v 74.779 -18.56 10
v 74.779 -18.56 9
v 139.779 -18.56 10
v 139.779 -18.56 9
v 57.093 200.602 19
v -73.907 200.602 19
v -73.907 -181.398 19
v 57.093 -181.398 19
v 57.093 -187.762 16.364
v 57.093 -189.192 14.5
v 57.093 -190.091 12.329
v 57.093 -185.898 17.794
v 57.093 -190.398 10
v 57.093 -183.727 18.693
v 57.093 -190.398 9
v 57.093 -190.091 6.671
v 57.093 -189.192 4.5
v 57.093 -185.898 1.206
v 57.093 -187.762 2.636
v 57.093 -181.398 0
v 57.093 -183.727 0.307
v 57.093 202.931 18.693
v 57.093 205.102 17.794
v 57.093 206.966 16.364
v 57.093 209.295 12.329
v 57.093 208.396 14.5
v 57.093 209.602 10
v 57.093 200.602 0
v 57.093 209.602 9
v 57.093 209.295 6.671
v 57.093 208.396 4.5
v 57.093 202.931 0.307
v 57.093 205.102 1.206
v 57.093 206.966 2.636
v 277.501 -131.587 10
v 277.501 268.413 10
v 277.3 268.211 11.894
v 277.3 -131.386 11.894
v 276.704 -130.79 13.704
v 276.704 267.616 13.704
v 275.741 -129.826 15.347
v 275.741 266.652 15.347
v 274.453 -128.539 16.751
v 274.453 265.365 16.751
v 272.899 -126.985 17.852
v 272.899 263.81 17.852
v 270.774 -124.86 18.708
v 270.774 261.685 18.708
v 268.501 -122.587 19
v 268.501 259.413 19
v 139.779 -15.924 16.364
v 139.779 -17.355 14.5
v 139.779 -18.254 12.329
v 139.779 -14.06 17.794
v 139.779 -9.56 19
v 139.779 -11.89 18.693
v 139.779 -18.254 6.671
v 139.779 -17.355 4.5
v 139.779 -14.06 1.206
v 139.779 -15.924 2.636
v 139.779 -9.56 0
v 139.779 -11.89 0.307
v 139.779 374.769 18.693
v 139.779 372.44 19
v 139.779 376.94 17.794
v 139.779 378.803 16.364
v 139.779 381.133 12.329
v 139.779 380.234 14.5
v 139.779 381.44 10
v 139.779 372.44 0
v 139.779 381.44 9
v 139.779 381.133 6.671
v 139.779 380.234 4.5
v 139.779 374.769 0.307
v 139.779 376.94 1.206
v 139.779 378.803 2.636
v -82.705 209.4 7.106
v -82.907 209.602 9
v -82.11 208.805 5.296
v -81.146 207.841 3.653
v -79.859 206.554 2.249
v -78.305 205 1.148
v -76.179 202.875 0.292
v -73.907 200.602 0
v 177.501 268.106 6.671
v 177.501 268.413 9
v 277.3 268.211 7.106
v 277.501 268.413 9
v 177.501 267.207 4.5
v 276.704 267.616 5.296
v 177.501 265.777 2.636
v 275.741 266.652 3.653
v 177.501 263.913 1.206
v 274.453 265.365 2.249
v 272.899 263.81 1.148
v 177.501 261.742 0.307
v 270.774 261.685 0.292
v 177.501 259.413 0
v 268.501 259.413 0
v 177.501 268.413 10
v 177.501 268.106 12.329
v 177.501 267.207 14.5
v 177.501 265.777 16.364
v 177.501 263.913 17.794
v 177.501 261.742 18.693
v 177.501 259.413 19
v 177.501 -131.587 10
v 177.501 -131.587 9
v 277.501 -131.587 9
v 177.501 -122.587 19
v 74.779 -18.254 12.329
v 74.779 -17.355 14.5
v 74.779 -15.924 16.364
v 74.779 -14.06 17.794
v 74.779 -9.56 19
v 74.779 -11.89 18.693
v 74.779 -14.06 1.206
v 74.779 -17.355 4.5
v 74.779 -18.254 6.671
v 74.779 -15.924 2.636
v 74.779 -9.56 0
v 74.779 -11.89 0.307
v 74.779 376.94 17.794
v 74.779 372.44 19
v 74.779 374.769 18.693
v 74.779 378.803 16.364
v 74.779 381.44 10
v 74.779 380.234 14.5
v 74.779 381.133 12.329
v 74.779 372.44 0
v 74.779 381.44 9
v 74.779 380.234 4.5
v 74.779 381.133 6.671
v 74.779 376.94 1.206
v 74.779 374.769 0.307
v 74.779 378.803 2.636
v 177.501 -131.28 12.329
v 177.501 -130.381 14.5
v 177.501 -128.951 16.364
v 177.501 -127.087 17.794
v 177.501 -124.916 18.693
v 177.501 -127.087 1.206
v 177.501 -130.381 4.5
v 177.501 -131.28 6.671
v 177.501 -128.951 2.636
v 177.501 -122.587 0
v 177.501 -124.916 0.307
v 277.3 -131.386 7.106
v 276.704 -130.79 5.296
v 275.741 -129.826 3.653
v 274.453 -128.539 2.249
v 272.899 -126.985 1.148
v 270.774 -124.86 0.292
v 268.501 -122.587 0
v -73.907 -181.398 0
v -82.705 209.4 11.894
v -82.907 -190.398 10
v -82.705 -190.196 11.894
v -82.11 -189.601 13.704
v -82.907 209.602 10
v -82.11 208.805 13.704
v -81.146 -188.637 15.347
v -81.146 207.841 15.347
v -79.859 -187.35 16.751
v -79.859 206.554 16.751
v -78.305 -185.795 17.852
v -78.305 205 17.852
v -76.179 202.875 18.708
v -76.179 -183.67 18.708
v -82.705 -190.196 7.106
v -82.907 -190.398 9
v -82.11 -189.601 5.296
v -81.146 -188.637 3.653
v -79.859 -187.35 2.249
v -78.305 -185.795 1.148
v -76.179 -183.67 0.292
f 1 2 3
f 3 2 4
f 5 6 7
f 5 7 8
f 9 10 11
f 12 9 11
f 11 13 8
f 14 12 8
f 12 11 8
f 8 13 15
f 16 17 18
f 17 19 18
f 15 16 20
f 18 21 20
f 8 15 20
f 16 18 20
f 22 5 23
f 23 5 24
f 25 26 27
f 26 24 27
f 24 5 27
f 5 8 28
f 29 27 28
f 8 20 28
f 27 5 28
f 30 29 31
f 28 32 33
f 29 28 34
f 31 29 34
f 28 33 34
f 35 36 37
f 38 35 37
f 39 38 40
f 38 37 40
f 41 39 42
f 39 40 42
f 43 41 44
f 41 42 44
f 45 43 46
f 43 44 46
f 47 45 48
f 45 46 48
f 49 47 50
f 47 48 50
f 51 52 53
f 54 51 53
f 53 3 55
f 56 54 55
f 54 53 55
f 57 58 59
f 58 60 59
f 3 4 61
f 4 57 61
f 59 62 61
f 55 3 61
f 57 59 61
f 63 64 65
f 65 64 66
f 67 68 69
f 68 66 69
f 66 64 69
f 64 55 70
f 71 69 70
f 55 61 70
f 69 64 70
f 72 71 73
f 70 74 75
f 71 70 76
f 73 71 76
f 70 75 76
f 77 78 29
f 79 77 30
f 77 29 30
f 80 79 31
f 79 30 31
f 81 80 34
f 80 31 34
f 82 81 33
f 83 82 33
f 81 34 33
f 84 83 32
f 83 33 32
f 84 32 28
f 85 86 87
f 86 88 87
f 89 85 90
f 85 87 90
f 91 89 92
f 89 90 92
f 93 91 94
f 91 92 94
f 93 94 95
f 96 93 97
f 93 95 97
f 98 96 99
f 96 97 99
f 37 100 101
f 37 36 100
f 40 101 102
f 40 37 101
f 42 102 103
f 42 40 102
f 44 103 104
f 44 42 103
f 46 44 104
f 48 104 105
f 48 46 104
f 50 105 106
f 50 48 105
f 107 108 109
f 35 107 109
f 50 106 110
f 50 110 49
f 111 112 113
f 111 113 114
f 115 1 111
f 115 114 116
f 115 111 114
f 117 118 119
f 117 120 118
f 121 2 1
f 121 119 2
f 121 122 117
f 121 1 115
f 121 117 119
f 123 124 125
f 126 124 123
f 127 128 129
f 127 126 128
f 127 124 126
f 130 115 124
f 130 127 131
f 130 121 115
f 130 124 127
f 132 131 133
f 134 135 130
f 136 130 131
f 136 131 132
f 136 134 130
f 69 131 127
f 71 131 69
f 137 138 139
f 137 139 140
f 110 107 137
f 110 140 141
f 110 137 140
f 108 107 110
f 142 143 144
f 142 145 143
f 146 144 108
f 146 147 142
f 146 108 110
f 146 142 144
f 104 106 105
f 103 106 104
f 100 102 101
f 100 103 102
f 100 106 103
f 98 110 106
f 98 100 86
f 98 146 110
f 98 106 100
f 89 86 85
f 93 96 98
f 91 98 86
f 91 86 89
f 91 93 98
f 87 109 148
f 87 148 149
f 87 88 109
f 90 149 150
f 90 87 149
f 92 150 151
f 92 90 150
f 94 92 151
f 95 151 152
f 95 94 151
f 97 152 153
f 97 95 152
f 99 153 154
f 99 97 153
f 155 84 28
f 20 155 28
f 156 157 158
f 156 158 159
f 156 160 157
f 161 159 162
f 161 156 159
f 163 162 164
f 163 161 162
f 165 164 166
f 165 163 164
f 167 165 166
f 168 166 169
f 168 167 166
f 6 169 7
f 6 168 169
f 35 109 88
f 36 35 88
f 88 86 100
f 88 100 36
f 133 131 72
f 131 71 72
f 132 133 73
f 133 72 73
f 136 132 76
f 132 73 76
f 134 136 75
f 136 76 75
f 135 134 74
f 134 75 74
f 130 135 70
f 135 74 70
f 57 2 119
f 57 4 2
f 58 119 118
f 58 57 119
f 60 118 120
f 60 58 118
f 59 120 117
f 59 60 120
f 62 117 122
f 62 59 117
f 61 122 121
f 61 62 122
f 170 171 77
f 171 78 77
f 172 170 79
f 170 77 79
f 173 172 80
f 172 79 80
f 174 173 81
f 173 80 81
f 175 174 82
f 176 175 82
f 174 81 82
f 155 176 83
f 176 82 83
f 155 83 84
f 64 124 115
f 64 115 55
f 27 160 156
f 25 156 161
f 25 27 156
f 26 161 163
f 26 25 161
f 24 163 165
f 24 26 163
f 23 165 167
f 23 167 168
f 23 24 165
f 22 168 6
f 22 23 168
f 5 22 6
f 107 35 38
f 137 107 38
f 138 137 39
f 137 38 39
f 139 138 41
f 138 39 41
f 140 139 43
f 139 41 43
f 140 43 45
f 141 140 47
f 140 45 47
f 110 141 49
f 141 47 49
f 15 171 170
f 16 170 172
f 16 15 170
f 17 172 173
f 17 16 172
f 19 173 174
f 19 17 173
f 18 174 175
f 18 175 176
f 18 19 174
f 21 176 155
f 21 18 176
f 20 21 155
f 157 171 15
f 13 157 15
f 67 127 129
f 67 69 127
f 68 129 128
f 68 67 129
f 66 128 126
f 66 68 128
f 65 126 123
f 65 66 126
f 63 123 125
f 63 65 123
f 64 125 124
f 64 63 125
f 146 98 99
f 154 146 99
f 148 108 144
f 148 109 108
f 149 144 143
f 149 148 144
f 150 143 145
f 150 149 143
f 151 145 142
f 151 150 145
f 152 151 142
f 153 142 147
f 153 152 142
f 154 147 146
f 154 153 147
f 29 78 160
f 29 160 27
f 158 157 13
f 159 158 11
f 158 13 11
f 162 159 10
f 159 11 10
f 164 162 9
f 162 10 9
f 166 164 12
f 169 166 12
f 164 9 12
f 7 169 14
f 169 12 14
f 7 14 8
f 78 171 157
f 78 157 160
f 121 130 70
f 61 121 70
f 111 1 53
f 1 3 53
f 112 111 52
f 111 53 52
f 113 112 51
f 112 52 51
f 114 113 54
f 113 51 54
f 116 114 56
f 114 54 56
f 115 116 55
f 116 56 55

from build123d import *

# Parameters (mm, degrees)
F0_W     = 140
F0_H     = 400
F3_DEPTH = 19
F1_W     = 65
F1_H     = 400
F4_DEPTH = 19
F2_W     = 100
F2_H     = 400
F5_DEPTH = 19
F6_R     = 9
F7_R     = 9
F8_R     = 9


with BuildPart() as f3:
    # F0 (on Top) → F3 (new body)
    with BuildSketch(Plane.XY):
        with Locations((-12.906995, 9.602098)):
            Rectangle(F0_W, F0_H)
    extrude(amount=F3_DEPTH)

    # F6
    f6_edges = [f3.edges().sort_by_distance(p)[0] for p in [
        (-12.906995, -190.397902, 19),
        (-82.906995, 9.602098, 19),
        (-12.906995, 209.602098, 19),
        (-12.906995, -190.397902, 0),
        (-82.906995, 9.602098, 0),
        (-12.906995, 209.602098, 0),
    ]]
    fillet(f6_edges, radius=F6_R)


with BuildPart() as f4:
    # F1 (on Top) → F4 (new body)
    with BuildSketch(Plane.XY):
        with Locations((107.279327, 181.439504)):
            Rectangle(F1_W, F1_H)
    extrude(amount=F4_DEPTH)

    # F7
    f7_edges = [f4.edges().sort_by_distance(p)[0] for p in [
        (107.279327, 381.439504, 19),
        (107.279327, 381.439504, 0),
        (107.279327, -18.560496, 19),
        (107.279327, -18.560496, 0),
    ]]
    fillet(f7_edges, radius=F7_R)


with BuildPart() as f5:
    # F2 (on Top) → F5 (new body)
    with BuildSketch(Plane.XY):
        with Locations((227.501377, 68.412898)):
            Rectangle(F2_W, F2_H)
    extrude(amount=F5_DEPTH)

    # F8
    f8_edges = [f5.edges().sort_by_distance(p)[0] for p in [
        (227.501377, -131.587102, 19),
        (227.501377, -131.587102, 0),
        (277.501377, 68.412898, 19),
        (277.501377, 68.412898, 0),
        (227.501377, 268.412898, 19),
        (227.501377, 268.412898, 0),
    ]]
    fillet(f8_edges, radius=F8_R)


solid = Compound([f3.part, f4.part, f5.part])
